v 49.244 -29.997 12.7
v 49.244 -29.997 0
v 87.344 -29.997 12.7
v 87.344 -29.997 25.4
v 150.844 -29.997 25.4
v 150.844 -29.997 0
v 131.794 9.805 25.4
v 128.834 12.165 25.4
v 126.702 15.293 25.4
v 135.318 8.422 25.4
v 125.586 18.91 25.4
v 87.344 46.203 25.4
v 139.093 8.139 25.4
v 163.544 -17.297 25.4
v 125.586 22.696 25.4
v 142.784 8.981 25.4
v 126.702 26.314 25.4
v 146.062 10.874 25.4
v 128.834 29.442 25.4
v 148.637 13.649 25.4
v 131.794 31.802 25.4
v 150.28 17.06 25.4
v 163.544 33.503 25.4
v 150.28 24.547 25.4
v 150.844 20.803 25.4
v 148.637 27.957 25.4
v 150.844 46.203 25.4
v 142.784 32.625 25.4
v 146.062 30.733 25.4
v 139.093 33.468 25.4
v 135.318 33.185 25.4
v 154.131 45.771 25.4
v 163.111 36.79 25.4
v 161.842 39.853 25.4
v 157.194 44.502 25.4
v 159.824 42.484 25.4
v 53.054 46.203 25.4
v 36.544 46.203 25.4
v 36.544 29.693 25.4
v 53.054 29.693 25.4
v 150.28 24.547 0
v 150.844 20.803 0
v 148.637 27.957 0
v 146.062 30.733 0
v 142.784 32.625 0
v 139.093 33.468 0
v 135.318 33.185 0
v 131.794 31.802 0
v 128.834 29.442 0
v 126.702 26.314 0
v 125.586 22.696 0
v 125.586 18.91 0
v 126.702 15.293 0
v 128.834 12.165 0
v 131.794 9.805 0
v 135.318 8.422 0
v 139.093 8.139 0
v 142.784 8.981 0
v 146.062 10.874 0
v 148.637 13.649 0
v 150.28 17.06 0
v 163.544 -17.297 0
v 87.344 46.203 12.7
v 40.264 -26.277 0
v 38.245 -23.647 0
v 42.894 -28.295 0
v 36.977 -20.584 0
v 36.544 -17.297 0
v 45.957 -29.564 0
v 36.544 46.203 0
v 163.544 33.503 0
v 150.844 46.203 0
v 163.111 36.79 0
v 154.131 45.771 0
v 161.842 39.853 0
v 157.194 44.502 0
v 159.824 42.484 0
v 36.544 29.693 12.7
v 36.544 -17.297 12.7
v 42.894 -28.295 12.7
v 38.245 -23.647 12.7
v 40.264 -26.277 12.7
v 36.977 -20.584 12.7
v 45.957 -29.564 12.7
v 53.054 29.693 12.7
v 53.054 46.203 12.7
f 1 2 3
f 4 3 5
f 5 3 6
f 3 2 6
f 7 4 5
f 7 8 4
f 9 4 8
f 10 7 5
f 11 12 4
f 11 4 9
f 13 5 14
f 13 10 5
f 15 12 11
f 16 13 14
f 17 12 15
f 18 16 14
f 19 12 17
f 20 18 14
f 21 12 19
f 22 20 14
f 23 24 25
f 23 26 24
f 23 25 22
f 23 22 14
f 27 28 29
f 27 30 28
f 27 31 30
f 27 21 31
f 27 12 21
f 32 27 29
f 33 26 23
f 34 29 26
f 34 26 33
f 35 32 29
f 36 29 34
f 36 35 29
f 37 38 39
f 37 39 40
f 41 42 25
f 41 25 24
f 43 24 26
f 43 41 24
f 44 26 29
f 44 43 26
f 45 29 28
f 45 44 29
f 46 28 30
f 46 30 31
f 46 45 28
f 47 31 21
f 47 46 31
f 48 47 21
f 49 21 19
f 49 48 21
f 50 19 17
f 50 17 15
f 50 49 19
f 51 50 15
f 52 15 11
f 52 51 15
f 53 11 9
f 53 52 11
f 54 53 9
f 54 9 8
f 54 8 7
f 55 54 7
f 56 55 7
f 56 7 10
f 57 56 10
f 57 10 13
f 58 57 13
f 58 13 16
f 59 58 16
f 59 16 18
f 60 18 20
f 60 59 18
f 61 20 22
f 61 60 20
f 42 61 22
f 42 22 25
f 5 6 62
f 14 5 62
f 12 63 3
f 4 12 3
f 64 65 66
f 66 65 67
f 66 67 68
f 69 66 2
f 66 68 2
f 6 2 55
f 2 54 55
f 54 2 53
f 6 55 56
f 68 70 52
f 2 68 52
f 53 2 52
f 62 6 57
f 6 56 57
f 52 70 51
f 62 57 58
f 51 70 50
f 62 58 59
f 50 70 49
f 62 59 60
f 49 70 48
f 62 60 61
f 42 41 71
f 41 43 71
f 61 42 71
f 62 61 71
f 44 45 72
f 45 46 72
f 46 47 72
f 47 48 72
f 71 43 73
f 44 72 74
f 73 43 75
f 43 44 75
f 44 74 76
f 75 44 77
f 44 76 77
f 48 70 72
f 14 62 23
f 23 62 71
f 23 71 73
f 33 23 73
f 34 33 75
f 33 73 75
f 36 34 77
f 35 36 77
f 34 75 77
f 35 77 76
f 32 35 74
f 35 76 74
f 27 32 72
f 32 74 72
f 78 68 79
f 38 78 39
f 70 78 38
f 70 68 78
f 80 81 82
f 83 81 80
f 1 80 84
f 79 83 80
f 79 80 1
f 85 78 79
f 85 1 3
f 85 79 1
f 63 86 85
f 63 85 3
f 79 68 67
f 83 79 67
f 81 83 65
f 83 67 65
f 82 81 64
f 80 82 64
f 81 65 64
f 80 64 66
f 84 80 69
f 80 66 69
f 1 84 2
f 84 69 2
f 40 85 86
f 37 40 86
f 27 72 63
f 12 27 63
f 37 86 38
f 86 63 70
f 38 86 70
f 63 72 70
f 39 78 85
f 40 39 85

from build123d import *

# Parameters (mm, degrees)
SKETCH1_R           = 12.7
BOSS_EXTRUDE1_DEPTH = 25.4
SKETCH1_4_W         = 16.51
SKETCH1_4_H         = 16.51
BOSS_EXTRUDE2_DEPTH = 25.4
BOSS_EXTRUDE3_DEPTH = 12.7


with BuildPart() as part:
    # Sketch1 → Boss-Extrude1 (new body)
    with BuildSketch(Plane.XY):
        with BuildLine():
            Line((150.843809628, 46.203312203), (87.343809628, 46.203312203))
            Line((87.343809628, 46.203312203), (87.343809628, -29.996687797))
            Line((87.343809628, -29.996687797), (150.843809628, -29.996687797))
            Line((150.843809628, -29.996687797), (163.543809628, -17.296687797))
            Line((163.543809628, -17.296687797), (163.543809628, 33.503312203))
            ThreePointArc((163.543809628, 33.503312203), (159.824065749, 42.483568324), (150.843809628, 46.203312203))
        make_face()
        with Locations((138.143809628, 20.803312203)):
            Circle(SKETCH1_R, mode=Mode.SUBTRACT)
    extrude(amount=BOSS_EXTRUDE1_DEPTH)



with BuildPart() as body_2:
    # Sketch1<4> → Boss-Extrude2 (new body)
    with BuildSketch(Plane.XY):
        with Locations((44.798809628, 37.948312203)):
            Rectangle(SKETCH1_4_W, SKETCH1_4_H)
    extrude(amount=BOSS_EXTRUDE2_DEPTH)


with BuildPart() as part_1:
    add(part.part)

    add(body_2.part)  # Boss-Extrude3 merges body 2
    # Sketch1<5> → Boss-Extrude3 (add)
    with BuildSketch(Plane.XY):
        with BuildLine():
            Line((87.343809628, 46.203312203), (53.053809628, 46.203312203))
            Line((53.053809628, 46.203312203), (53.053809628, 29.693312203))
            Line((53.053809628, 29.693312203), (36.543809628, 29.693312203))
            Line((36.543809628, 29.693312203), (36.543809628, -17.296687797))
            ThreePointArc((36.543809628, -17.296687797), (40.263553507, -26.276943918), (49.243809628, -29.996687797))
            Line((49.243809628, -29.996687797), (87.343809628, -29.996687797))
            Line((87.343809628, -29.996687797), (87.343809628, 46.203312203))
        make_face()
    extrude(amount=BOSS_EXTRUDE3_DEPTH)


solid = part_1.part
